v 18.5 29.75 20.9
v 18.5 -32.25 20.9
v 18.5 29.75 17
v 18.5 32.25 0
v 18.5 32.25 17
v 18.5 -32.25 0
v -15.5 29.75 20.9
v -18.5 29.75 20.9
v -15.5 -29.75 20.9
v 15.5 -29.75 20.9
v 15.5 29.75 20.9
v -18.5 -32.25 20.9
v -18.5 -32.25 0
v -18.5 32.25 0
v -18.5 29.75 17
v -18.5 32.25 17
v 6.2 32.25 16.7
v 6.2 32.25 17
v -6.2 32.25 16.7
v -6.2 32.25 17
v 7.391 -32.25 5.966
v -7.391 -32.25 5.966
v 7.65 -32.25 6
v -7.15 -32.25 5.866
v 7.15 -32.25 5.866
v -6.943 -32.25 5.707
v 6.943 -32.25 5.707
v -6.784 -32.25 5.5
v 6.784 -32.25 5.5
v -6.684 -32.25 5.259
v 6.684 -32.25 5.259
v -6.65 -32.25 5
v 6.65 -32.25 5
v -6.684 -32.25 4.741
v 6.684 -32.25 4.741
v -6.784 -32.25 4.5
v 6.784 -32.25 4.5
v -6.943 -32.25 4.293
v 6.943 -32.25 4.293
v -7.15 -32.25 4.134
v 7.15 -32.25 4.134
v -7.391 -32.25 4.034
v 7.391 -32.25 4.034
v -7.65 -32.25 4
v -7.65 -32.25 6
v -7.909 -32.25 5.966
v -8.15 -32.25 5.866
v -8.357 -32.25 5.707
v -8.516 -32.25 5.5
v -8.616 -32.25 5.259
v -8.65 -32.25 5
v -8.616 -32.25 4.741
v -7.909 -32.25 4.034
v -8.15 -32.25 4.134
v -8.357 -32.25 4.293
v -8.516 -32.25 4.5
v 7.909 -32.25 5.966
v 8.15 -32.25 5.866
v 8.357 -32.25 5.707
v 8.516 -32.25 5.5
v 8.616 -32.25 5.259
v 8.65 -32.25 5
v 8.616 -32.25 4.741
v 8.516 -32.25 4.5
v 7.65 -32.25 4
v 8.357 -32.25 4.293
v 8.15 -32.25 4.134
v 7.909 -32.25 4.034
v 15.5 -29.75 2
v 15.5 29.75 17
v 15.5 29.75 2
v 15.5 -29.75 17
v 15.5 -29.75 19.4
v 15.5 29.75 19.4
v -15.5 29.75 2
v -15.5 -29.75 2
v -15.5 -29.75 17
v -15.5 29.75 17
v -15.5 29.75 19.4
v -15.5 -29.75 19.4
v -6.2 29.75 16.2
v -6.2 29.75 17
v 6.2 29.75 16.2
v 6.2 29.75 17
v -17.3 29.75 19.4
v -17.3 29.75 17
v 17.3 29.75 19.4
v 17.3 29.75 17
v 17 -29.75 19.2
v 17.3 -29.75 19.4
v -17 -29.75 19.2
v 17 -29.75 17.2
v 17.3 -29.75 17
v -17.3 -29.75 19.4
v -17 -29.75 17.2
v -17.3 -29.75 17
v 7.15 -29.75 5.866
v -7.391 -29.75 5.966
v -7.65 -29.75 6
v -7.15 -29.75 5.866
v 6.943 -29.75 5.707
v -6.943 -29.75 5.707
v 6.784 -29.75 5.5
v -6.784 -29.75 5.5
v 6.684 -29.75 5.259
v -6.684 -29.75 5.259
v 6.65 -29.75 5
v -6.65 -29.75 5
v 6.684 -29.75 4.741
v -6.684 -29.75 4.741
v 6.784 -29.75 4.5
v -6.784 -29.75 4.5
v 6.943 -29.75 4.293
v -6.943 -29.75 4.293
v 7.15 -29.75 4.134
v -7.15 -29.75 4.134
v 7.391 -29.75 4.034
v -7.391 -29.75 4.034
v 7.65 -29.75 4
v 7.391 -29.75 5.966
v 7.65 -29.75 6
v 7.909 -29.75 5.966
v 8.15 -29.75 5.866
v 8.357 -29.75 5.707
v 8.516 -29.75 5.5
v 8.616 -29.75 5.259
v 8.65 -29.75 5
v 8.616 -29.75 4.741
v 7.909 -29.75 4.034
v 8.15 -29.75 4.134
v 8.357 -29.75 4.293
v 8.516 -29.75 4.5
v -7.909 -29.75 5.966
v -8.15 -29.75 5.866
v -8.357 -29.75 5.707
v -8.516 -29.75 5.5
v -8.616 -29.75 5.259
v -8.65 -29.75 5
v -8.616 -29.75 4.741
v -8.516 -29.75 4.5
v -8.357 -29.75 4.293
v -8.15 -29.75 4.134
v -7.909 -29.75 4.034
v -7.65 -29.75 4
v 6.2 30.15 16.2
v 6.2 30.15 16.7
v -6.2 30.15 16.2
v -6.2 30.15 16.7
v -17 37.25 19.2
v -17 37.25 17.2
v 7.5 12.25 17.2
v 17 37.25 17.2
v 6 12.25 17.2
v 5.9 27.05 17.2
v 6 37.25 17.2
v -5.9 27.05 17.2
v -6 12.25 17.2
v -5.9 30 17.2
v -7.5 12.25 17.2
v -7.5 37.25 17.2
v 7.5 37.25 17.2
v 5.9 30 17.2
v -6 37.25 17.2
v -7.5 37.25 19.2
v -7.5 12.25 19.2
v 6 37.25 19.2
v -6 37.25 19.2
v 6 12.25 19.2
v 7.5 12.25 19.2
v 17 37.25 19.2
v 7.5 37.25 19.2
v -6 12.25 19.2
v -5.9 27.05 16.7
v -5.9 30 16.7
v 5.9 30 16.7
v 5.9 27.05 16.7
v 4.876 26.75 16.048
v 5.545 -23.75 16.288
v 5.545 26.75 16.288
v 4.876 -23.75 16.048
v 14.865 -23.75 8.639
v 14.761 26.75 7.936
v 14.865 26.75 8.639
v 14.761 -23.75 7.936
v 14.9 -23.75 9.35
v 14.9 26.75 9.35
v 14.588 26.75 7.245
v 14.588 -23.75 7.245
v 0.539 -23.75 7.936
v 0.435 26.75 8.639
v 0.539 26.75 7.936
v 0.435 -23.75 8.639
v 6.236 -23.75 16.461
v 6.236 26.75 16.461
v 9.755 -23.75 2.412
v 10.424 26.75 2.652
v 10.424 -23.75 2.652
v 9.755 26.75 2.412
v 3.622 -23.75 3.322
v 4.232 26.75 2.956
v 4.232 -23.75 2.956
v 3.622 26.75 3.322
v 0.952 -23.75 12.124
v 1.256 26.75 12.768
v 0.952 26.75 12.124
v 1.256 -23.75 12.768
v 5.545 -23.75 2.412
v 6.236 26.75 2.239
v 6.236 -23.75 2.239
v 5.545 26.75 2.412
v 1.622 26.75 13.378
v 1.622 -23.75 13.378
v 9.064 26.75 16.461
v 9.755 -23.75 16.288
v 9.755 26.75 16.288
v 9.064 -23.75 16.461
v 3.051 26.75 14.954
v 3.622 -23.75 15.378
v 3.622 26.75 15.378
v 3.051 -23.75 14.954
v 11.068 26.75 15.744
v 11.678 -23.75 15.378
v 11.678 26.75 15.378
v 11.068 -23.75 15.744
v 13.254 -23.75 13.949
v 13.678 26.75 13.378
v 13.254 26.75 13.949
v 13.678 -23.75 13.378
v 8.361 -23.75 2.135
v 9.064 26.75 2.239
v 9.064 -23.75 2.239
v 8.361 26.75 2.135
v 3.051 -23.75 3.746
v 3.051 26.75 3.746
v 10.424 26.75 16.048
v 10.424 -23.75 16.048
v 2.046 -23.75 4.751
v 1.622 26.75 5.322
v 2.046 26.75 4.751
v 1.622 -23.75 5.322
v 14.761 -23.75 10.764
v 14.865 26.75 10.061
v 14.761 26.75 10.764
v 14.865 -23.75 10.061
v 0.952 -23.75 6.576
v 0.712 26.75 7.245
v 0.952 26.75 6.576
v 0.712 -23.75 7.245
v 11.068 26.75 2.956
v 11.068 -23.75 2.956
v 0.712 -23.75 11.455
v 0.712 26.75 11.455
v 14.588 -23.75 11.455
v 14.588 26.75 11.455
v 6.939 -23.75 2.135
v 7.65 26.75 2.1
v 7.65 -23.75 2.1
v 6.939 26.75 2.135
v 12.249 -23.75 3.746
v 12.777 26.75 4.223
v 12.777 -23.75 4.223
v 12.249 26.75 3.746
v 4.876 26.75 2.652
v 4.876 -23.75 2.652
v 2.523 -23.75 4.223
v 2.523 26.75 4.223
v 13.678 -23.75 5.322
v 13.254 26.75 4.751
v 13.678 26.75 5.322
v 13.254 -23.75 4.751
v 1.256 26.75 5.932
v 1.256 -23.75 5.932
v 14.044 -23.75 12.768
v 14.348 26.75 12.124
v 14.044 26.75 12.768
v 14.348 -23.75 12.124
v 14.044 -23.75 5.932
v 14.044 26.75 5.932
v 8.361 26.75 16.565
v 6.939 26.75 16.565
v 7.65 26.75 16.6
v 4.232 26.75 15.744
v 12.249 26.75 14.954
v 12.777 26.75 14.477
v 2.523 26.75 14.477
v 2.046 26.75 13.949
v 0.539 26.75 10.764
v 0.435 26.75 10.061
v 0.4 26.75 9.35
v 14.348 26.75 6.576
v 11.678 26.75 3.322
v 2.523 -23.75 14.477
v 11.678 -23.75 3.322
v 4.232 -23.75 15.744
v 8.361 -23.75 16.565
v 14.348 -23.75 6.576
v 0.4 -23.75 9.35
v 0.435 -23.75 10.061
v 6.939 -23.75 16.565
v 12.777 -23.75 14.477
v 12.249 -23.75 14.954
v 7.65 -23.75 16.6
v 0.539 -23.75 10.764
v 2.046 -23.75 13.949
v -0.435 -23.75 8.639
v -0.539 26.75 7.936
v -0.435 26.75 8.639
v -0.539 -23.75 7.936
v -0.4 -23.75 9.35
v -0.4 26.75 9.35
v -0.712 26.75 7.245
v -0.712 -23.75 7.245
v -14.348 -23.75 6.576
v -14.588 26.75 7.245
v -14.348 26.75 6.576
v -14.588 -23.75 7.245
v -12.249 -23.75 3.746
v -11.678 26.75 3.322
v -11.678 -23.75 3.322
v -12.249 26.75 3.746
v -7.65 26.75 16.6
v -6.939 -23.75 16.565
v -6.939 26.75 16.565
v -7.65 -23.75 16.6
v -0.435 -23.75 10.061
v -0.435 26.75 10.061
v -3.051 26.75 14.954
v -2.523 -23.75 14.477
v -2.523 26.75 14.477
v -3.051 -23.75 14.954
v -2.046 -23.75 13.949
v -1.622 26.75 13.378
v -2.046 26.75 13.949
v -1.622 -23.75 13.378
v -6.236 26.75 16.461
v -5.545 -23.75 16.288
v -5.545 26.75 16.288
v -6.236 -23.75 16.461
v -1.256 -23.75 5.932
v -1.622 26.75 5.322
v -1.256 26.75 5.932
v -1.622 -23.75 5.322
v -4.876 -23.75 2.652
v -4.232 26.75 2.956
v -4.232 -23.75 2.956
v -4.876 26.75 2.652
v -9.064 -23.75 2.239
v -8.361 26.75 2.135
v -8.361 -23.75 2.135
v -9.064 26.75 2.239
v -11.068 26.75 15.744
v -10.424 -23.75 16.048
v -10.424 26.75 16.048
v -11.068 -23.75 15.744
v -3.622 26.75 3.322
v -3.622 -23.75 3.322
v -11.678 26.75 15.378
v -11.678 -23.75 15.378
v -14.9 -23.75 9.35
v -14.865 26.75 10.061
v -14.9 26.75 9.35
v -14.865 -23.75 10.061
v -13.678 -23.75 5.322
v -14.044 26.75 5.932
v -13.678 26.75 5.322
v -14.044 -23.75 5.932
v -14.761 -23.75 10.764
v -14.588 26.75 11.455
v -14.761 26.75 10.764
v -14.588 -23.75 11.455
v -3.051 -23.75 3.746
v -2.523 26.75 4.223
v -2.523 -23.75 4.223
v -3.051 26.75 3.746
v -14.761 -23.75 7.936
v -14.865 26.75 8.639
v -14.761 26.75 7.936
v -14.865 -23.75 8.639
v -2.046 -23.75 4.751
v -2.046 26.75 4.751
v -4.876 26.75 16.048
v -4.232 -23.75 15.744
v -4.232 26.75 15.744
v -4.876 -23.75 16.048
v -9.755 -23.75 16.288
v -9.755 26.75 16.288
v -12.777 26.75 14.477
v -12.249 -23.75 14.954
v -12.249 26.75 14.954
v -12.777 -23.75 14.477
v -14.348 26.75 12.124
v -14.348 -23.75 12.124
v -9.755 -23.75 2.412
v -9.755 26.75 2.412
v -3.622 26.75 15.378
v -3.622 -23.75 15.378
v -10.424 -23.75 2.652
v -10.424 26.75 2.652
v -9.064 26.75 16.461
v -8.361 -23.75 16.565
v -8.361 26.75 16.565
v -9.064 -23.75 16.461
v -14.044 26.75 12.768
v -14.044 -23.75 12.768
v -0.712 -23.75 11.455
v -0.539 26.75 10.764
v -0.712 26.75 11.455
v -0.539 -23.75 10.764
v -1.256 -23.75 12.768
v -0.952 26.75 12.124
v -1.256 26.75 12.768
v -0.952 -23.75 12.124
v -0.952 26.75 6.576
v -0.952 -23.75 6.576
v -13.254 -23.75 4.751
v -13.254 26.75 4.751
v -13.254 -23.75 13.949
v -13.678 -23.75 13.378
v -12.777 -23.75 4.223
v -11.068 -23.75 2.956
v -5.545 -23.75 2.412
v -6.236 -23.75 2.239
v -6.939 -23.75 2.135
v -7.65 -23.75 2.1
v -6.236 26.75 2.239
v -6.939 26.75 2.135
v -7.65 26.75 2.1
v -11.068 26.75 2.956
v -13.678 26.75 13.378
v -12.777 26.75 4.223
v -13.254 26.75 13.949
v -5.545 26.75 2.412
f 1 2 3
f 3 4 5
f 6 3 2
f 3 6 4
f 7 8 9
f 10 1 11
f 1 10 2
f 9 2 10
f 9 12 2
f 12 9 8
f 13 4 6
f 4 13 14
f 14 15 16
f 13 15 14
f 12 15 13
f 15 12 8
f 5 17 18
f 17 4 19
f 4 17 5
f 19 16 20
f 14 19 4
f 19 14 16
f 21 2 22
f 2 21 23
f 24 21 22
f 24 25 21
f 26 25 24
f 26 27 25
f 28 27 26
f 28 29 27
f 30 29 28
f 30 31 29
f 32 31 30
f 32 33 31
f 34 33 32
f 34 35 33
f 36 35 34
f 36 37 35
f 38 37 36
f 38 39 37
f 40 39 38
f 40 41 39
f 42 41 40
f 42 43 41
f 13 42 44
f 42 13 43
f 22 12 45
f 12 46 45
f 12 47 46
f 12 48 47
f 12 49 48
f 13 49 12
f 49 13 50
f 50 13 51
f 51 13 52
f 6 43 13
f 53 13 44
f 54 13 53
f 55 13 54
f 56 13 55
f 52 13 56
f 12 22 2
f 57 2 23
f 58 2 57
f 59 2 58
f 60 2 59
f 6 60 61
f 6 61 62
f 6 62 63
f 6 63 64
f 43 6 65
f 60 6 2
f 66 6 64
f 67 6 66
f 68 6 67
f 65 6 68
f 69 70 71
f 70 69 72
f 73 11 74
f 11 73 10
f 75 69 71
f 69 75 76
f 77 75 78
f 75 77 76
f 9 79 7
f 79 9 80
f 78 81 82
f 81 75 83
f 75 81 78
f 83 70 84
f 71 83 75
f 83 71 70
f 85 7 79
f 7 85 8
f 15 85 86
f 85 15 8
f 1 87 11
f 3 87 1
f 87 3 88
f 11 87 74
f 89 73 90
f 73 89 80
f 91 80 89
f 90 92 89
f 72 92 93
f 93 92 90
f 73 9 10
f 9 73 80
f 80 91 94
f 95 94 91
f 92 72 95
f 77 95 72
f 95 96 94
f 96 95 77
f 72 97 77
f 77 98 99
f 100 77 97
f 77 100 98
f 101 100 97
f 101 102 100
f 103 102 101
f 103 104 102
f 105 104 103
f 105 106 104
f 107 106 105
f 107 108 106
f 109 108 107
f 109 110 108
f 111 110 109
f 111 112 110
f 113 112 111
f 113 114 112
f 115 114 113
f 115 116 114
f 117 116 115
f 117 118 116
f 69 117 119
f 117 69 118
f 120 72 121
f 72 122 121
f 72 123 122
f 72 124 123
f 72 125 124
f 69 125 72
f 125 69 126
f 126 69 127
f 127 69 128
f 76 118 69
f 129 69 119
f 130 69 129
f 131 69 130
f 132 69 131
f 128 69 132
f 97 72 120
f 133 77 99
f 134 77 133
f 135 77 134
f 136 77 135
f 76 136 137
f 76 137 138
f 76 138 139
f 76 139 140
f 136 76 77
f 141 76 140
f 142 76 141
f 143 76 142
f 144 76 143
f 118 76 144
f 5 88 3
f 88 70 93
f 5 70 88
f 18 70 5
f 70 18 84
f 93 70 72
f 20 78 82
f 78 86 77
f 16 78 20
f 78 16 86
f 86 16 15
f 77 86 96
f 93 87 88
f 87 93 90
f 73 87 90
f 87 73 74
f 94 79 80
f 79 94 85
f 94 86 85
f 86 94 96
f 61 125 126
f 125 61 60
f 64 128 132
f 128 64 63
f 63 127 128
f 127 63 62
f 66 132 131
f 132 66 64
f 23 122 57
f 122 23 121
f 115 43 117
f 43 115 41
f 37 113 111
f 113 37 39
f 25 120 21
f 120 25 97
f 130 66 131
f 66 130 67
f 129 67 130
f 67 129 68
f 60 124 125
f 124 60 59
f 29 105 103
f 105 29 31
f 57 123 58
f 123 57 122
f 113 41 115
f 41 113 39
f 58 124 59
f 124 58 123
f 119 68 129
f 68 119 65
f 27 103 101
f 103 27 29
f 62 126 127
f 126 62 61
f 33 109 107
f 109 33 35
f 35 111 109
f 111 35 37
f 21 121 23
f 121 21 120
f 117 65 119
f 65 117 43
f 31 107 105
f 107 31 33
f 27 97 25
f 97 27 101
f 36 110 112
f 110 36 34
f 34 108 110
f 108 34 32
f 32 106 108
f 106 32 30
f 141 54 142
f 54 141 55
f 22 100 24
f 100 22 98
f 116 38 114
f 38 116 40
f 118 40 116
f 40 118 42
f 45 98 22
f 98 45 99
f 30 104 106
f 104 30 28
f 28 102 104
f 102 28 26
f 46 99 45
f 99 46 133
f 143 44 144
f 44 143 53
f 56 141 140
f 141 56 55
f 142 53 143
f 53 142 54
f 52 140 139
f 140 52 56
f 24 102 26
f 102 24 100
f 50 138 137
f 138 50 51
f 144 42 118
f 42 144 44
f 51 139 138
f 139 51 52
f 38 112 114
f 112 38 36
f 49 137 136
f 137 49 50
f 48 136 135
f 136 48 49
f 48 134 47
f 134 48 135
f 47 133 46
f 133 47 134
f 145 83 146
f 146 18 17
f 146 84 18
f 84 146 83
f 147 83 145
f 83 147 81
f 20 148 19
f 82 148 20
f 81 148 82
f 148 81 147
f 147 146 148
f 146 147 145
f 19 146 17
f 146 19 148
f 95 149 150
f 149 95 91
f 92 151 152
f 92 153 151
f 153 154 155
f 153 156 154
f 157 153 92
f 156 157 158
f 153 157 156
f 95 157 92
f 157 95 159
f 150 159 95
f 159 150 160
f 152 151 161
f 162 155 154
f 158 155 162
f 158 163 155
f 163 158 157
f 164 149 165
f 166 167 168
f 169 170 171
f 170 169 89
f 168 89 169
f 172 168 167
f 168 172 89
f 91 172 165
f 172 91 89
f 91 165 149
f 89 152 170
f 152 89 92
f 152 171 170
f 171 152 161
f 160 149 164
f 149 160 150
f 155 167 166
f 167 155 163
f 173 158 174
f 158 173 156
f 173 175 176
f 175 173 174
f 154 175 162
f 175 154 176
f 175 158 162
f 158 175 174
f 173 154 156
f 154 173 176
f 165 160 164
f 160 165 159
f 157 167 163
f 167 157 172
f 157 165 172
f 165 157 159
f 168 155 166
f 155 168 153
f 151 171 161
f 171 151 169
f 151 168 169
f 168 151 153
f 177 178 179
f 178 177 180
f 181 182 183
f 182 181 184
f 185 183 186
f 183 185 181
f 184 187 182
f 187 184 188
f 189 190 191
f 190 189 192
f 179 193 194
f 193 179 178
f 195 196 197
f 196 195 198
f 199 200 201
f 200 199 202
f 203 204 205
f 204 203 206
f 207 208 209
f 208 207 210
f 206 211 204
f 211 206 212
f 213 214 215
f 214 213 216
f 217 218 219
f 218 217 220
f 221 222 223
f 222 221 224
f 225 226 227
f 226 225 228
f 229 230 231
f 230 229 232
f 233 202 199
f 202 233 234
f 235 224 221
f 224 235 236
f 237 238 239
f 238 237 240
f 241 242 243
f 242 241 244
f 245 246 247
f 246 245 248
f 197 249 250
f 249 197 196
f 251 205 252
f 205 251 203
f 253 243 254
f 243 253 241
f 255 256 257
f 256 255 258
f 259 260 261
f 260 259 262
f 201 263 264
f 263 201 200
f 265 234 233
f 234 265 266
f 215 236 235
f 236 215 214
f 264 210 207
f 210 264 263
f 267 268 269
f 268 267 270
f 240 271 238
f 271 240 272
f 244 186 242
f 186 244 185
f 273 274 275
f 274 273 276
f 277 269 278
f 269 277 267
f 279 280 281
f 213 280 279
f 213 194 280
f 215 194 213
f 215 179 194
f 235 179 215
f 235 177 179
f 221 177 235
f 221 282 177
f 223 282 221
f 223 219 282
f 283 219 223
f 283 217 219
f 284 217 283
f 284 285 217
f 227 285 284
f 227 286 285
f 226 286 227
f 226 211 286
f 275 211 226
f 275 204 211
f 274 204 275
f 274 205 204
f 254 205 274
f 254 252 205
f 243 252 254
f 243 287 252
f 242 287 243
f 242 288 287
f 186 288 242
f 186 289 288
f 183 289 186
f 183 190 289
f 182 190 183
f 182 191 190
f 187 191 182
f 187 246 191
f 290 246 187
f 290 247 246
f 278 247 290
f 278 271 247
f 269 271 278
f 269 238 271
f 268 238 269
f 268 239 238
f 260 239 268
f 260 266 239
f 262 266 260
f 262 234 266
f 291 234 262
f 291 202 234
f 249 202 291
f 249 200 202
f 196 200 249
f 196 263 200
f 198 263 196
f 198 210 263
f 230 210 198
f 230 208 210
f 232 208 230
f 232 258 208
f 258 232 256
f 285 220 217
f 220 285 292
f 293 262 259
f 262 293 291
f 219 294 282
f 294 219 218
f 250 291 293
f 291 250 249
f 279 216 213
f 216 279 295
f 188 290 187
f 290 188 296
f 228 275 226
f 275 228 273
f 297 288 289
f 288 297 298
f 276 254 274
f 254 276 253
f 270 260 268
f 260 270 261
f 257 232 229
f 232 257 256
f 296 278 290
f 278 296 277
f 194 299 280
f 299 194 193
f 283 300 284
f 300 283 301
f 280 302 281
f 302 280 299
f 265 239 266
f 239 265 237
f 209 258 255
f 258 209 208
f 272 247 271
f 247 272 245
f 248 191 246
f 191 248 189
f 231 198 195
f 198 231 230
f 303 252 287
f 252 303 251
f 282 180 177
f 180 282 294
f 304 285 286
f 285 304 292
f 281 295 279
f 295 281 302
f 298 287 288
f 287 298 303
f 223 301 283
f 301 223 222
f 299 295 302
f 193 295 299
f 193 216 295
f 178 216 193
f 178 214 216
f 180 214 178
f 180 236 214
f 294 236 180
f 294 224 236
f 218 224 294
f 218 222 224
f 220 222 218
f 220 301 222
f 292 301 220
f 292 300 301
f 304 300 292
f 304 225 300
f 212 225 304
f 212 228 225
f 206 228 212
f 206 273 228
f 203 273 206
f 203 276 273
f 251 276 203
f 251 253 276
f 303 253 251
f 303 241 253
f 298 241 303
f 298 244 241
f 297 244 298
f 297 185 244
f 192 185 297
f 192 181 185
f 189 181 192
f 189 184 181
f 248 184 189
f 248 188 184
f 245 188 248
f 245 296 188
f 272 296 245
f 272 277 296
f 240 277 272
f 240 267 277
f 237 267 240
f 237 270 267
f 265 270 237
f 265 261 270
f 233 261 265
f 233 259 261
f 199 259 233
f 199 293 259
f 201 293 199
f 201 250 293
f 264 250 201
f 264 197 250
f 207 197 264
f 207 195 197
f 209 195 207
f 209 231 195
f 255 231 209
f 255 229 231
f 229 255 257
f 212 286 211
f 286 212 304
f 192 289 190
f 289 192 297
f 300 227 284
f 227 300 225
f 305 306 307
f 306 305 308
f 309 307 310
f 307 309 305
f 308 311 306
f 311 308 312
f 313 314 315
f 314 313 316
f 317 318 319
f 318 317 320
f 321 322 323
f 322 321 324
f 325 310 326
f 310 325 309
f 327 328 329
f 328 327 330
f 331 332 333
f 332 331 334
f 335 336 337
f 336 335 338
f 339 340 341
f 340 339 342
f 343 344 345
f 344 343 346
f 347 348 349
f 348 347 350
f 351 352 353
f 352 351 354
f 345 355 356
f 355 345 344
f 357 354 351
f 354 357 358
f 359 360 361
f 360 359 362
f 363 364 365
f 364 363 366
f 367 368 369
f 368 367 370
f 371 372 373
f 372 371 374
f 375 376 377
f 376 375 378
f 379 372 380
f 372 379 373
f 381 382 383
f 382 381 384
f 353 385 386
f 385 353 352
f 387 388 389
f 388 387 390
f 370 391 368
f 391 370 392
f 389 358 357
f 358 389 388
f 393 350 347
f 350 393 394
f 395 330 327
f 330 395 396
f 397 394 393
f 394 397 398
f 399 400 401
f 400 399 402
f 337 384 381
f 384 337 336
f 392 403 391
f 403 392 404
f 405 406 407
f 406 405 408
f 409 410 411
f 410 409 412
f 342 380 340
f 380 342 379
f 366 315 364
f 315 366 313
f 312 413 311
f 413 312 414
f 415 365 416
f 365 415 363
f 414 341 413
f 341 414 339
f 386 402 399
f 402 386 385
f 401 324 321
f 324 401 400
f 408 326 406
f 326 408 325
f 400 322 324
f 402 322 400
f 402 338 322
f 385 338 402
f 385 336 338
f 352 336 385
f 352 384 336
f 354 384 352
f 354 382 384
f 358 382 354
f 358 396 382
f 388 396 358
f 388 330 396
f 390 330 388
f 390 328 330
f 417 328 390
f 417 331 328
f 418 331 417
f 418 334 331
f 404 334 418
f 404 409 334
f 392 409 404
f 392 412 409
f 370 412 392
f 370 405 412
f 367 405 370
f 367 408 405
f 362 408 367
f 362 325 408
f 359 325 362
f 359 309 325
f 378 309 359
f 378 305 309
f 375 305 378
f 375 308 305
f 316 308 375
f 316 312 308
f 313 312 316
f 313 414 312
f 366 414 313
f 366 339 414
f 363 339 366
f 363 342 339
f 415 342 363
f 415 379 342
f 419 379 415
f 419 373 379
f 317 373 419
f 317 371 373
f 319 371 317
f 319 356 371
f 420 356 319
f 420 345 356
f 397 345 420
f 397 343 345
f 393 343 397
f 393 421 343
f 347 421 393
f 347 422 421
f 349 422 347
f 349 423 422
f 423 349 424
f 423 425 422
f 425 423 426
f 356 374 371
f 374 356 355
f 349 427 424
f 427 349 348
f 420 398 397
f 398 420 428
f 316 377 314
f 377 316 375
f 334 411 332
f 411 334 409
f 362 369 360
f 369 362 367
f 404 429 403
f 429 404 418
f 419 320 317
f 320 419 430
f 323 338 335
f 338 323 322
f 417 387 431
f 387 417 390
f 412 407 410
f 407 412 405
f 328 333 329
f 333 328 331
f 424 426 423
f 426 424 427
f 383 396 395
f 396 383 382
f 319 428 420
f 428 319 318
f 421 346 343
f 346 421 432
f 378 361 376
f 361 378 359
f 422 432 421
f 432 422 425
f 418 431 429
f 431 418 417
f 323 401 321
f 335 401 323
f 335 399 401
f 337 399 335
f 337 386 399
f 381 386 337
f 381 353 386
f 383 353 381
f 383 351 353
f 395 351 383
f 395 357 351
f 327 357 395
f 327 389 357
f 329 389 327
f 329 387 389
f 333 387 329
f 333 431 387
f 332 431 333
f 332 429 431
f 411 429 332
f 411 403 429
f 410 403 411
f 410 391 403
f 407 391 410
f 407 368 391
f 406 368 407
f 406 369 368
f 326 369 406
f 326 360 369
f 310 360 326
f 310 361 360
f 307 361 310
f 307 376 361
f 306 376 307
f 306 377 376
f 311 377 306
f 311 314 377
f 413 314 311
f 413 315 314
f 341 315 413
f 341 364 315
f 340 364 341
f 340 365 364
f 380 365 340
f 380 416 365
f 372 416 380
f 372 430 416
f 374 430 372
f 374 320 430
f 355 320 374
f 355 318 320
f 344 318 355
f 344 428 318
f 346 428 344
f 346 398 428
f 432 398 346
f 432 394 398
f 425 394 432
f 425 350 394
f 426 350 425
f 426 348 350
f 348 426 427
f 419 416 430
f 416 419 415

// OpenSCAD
/* Holder for two AA batteries with sliding cover.
   PLA, 0.4mm nozzle, no supports. Units mm.
   Print orientation: +Z up, parts rest on min z.
*/

// ---------- parameters ----------
battery_d = 14.5;
battery_l = 50.5;
side_gap = 0.6;      // battery side to wall
mid_gap = 0.8;       // between batteries
Wi = 2*battery_d + mid_gap + 2*side_gap; // 31.0 interior width
Li = battery_l + 3 + 6;                  // 59.5 interior length
floor_t = 2.0;
side_t = 3.0;
end_t = 2.5;
Wext = Wi + 2*side_t;   // 37
Lext = Li + 2*end_t;    // 64.5
wall_top = 20.9;
low_top = 17.0;
groove_bottom = 17.0;
groove_h = 2.4;
groove_top = groove_bottom + groove_h; // 19.4
groove_depth = 1.8;
engage = 1.5;
Wc = Wi + 2*engage;     // 34 cover width
Lc0 = Lext/2 + Li/2;      // 62 main length (leading edge butts on spring wall)
lip_len = 5.0;
Lc = Lc0 + lip_len;     // 67 total cover length
y0b = -Lext/2;          // -32.25 base min y
y1b = Lext/2;           // 32.25 base max y
y0c = -Li/2;            // -29.75 cover min y (stops at spring wall inner face)
y1c = Lext/2 + lip_len; // 37.25 cover max y
tc = 2.0;
finger_w = 12;
slot_w = 1.5;
finger_y0 = 12.25;
tooth_w = 11.8;
tooth_yl = 2.95;
tooth_y0 = 27.05;
tooth_y1 = tooth_y0 + tooth_yl; // 30.0: rides channel then drops into pocket
tooth_h = 0.5;
chan_hw = 6.2;
pock_y0 = 26.9;
pock_y1 = 30.15;
pock_floor = 16.2;
chan_floor = 16.7;
bx = battery_d/2 + mid_gap/2; // 7.65 battery center x
battery_y0 = -Li/2 + 6;       // -23.75 spring side
battery_y1 = battery_y0 + battery_l; // 26.75
battery_yc = (battery_y0 + battery_y1)/2; // 1.5
battery_zc = floor_t + battery_d/2 + 0.1; // 9.35 slight lift
wire_z = 5;
wire_r = 1.0;

part = "assembly"; // [base, cover, assembly]
cadverify_only = "";
module instance(name, part, unit = 1) {
    echo(cadverify_instance = [name, part, unit]);
    if (cadverify_only == "" || cadverify_only == name) children();
}

module battery() {
    rotate([-90,0,0])
        cylinder(d=battery_d, h=battery_l, center=true, $fn=64);
}

module base() {
    difference() {
        // outer solid
        translate([-Wext/2, y0b, 0])
            cube([Wext, Lext, wall_top]);
        // interior cavity open at top
        translate([-Wi/2, -Li/2, floor_t])
            cube([Wi, Li, wall_top - floor_t + 1]);
        // low end wall cut (+Y end)
        translate([-Wext/2, Li/2, low_top])
            cube([Wext, Lext/2 - Li/2 + 0.5, wall_top - low_top + 1]);
        // left groove
        translate([Wi/2, -Li/2, groove_bottom])
            cube([groove_depth, Li/2 + Lext/2 + 0.5, groove_h]);
        // right groove
        translate([-Wi/2 - groove_depth, -Li/2, groove_bottom])
            cube([groove_depth, Li/2 + Lext/2 + 0.5, groove_h]);
        // wire holes through spring (-Y) wall
        translate([bx, y0b - 1, wire_z])
            rotate([-90,0,0])
                cylinder(r=wire_r, h=end_t + 2, $fn=24);
        translate([-bx, y0b - 1, wire_z])
            rotate([-90,0,0])
                cylinder(r=wire_r, h=end_t + 2, $fn=24);
        // latch pocket (deep) + entry channel (shallow, open at +Y face) in low wall top
        translate([-chan_hw, pock_y0, pock_floor])
            cube([2*chan_hw, pock_y1 - pock_y0, low_top - pock_floor + 0.02]);
        translate([-chan_hw, pock_y1, chan_floor])
            cube([2*chan_hw, y1b - pock_y1 + 0.05, low_top - chan_floor + 0.02]);
    }
}

module cover() {
    // print orientation: plate 0..tc, tooth on top tc..tc+tooth_h
    difference() {
        union() {
            translate([-Wc/2, y0c, 0])
                cube([Wc, Lc, tc]);
            // latch tooth on top (becomes bottom after flip)
            translate([-tooth_w/2, tooth_y0, tc])
                cube([tooth_w, tooth_yl, tooth_h]);
        }
        // finger slots, open at +Y lip end
        translate([finger_w/2, finger_y0, -0.5])
            cube([slot_w, y1c - finger_y0 + 0.5, tc + 1.5]);
        translate([-finger_w/2 - slot_w, finger_y0, -0.5])
            cube([slot_w, y1c - finger_y0 + 0.5, tc + 1.5]);
    }
}

module assembly() {
    instance("base", "base", 1) base();
    instance("battery_left", "external", 1)
        translate([bx, battery_yc, battery_zc]) battery();
    instance("battery_right", "external", 1)
        translate([-bx, battery_yc, battery_zc]) battery();
    // cover printed upside-down: rotate 180 about Y then lift
    instance("cover", "cover", 1)
        translate([0, 0, 19.2]) rotate([0,180,0]) cover();
}

// ---------- specs ----------
if (part == "base") {
    echo(cadverify_spec = [
        ["bounds", [[-Wext/2, y0b, 0], [Wext/2, y1b, wall_top]]],
        ["bodies", 1],
        ["through_holes", 2],
        ["support_faces", [["bottom", "-z", 2000]]],
        ["overhangs_allowed", [
            ["groove ceilings bridge 3.6mm", [[Wi/2 - 0.6, -Li/2 - 0.5, groove_bottom - 0.5], [Wi/2 + groove_depth + 0.5, y1b + 0.2, groove_top + 0.6]]],
            ["groove ceilings bridge 3.6mm", [[-Wi/2 - groove_depth - 0.5, -Li/2 - 0.5, groove_bottom - 0.5], [-Wi/2 + 0.6, y1b + 0.2, groove_top + 0.6]]],
            ["wire holes 2mm dia bridges", [[-10, y0b - 0.5, wire_z - 1.5], [10, -Li/2 + 0.5, wire_z + 1.5]]]
        ]],
        ["copies", 1],
        ["details", [
            ["cavity", "void", [[-Wi/2, -Li/2, floor_t], [Wi/2, Li/2, 17]], 0.9],
            ["spring_room", "void", [[-Wi/2, -Li/2, floor_t], [Wi/2, -Li/2 + 6, 16.6]], 0.9],
            ["pos_room", "void", [[-Wi/2, Li/2 - 3, floor_t], [Wi/2, Li/2, 16.6]], 0.9],
            ["groove_left", "void", [[Wi/2, -Li/2, groove_bottom], [Wi/2 + groove_depth, y1b, groove_top]], 0.85],
            ["groove_right", "void", [[-Wi/2 - groove_depth, -Li/2, groove_bottom], [-Wi/2, y1b, groove_top]], 0.85],
            ["pocket", "void", [[-chan_hw, pock_y0, pock_floor], [chan_hw, pock_y1, low_top + 0.02]], 0.85],
            ["latch_channel", "void", [[-chan_hw, pock_y1, chan_floor], [chan_hw, y1b + 0.05, low_top + 0.02]], 0.85],
            ["wire1", "hole", [bx, y0b - 1, wire_z], [0, 1, 0], [[0, 2], [2, 2]]],
            ["wire2", "hole", [-bx, y0b - 1, wire_z], [0, 1, 0], [[0, 2], [2, 2]]],
            ["floor", "thickness", [0, 0, -1], [0, 0, 1], 2.0],
            ["side_wall", "thickness", [Wext/2 + 1, 0, 18.2], [-1, 0, 0], 1.2],
            ["end_wall", "thickness", [0, y1b + 1, 10], [0, -1, 0], 2.5]
        ]]
    ]);
    base();
} else if (part == "cover") {
    echo(cadverify_spec = [
        ["bounds", [[-Wc/2, y0c, 0], [Wc/2, y1c, tc + tooth_h]]],
        ["bodies", 1],
        ["through_holes", 0],
        ["support_faces", [["bottom", "-z", 1500]]],
        ["overhangs_allowed", []],
        ["copies", 1],
        ["details", [
            ["plate", "thickness", [0, -10, -1], [0, 0, 1], 2.0],
            ["finger", "material", [[-finger_w/2, finger_y0, 0], [finger_w/2, y1c, tc]], 0.85],
            ["slot_left", "void", [[finger_w/2, finger_y0, -0.5], [finger_w/2 + slot_w, y1c + 0.01, tc + 0.5]], 0.85],
            ["slot_right", "void", [[-finger_w/2 - slot_w, finger_y0, -0.5], [-finger_w/2, y1c + 0.01, tc + 0.5]], 0.85],
            ["tooth", "material", [[-tooth_w/2, tooth_y0, tc], [tooth_w/2, tooth_y1, tc + tooth_h]], 0.85],
            ["lip", "material", [[-Wc/2, y1b, 0], [Wc/2, y1c, tc]], 0.9]
        ]]
    ]);
    cover();
} else if (part == "assembly") {
    echo(cadverify_spec = [
        ["bounds", [[-Wext/2, y0b, 0], [Wext/2, y1c, wall_top]]],
        ["support_faces", [["bottom", "-z", 2000]]],
        ["allowed_interferences", []],
        ["motions", [
            ["slide_cover", ["cover"], "slide", [0, 1, 0], [0, 60], ["flex", [["cover", "base", 1.0, "flexible finger lifts tooth 0.5 over channel step"]]]]
        ]],
        ["assembly_order", [
            [["base"], [0, 0, 0]],
            [["battery_left"], [0, 0, -1]],
            [["battery_right"], [0, 0, -1]],
            [["cover"], [0, -1, 0]]
        ]]
    ]);
    assembly();
}
